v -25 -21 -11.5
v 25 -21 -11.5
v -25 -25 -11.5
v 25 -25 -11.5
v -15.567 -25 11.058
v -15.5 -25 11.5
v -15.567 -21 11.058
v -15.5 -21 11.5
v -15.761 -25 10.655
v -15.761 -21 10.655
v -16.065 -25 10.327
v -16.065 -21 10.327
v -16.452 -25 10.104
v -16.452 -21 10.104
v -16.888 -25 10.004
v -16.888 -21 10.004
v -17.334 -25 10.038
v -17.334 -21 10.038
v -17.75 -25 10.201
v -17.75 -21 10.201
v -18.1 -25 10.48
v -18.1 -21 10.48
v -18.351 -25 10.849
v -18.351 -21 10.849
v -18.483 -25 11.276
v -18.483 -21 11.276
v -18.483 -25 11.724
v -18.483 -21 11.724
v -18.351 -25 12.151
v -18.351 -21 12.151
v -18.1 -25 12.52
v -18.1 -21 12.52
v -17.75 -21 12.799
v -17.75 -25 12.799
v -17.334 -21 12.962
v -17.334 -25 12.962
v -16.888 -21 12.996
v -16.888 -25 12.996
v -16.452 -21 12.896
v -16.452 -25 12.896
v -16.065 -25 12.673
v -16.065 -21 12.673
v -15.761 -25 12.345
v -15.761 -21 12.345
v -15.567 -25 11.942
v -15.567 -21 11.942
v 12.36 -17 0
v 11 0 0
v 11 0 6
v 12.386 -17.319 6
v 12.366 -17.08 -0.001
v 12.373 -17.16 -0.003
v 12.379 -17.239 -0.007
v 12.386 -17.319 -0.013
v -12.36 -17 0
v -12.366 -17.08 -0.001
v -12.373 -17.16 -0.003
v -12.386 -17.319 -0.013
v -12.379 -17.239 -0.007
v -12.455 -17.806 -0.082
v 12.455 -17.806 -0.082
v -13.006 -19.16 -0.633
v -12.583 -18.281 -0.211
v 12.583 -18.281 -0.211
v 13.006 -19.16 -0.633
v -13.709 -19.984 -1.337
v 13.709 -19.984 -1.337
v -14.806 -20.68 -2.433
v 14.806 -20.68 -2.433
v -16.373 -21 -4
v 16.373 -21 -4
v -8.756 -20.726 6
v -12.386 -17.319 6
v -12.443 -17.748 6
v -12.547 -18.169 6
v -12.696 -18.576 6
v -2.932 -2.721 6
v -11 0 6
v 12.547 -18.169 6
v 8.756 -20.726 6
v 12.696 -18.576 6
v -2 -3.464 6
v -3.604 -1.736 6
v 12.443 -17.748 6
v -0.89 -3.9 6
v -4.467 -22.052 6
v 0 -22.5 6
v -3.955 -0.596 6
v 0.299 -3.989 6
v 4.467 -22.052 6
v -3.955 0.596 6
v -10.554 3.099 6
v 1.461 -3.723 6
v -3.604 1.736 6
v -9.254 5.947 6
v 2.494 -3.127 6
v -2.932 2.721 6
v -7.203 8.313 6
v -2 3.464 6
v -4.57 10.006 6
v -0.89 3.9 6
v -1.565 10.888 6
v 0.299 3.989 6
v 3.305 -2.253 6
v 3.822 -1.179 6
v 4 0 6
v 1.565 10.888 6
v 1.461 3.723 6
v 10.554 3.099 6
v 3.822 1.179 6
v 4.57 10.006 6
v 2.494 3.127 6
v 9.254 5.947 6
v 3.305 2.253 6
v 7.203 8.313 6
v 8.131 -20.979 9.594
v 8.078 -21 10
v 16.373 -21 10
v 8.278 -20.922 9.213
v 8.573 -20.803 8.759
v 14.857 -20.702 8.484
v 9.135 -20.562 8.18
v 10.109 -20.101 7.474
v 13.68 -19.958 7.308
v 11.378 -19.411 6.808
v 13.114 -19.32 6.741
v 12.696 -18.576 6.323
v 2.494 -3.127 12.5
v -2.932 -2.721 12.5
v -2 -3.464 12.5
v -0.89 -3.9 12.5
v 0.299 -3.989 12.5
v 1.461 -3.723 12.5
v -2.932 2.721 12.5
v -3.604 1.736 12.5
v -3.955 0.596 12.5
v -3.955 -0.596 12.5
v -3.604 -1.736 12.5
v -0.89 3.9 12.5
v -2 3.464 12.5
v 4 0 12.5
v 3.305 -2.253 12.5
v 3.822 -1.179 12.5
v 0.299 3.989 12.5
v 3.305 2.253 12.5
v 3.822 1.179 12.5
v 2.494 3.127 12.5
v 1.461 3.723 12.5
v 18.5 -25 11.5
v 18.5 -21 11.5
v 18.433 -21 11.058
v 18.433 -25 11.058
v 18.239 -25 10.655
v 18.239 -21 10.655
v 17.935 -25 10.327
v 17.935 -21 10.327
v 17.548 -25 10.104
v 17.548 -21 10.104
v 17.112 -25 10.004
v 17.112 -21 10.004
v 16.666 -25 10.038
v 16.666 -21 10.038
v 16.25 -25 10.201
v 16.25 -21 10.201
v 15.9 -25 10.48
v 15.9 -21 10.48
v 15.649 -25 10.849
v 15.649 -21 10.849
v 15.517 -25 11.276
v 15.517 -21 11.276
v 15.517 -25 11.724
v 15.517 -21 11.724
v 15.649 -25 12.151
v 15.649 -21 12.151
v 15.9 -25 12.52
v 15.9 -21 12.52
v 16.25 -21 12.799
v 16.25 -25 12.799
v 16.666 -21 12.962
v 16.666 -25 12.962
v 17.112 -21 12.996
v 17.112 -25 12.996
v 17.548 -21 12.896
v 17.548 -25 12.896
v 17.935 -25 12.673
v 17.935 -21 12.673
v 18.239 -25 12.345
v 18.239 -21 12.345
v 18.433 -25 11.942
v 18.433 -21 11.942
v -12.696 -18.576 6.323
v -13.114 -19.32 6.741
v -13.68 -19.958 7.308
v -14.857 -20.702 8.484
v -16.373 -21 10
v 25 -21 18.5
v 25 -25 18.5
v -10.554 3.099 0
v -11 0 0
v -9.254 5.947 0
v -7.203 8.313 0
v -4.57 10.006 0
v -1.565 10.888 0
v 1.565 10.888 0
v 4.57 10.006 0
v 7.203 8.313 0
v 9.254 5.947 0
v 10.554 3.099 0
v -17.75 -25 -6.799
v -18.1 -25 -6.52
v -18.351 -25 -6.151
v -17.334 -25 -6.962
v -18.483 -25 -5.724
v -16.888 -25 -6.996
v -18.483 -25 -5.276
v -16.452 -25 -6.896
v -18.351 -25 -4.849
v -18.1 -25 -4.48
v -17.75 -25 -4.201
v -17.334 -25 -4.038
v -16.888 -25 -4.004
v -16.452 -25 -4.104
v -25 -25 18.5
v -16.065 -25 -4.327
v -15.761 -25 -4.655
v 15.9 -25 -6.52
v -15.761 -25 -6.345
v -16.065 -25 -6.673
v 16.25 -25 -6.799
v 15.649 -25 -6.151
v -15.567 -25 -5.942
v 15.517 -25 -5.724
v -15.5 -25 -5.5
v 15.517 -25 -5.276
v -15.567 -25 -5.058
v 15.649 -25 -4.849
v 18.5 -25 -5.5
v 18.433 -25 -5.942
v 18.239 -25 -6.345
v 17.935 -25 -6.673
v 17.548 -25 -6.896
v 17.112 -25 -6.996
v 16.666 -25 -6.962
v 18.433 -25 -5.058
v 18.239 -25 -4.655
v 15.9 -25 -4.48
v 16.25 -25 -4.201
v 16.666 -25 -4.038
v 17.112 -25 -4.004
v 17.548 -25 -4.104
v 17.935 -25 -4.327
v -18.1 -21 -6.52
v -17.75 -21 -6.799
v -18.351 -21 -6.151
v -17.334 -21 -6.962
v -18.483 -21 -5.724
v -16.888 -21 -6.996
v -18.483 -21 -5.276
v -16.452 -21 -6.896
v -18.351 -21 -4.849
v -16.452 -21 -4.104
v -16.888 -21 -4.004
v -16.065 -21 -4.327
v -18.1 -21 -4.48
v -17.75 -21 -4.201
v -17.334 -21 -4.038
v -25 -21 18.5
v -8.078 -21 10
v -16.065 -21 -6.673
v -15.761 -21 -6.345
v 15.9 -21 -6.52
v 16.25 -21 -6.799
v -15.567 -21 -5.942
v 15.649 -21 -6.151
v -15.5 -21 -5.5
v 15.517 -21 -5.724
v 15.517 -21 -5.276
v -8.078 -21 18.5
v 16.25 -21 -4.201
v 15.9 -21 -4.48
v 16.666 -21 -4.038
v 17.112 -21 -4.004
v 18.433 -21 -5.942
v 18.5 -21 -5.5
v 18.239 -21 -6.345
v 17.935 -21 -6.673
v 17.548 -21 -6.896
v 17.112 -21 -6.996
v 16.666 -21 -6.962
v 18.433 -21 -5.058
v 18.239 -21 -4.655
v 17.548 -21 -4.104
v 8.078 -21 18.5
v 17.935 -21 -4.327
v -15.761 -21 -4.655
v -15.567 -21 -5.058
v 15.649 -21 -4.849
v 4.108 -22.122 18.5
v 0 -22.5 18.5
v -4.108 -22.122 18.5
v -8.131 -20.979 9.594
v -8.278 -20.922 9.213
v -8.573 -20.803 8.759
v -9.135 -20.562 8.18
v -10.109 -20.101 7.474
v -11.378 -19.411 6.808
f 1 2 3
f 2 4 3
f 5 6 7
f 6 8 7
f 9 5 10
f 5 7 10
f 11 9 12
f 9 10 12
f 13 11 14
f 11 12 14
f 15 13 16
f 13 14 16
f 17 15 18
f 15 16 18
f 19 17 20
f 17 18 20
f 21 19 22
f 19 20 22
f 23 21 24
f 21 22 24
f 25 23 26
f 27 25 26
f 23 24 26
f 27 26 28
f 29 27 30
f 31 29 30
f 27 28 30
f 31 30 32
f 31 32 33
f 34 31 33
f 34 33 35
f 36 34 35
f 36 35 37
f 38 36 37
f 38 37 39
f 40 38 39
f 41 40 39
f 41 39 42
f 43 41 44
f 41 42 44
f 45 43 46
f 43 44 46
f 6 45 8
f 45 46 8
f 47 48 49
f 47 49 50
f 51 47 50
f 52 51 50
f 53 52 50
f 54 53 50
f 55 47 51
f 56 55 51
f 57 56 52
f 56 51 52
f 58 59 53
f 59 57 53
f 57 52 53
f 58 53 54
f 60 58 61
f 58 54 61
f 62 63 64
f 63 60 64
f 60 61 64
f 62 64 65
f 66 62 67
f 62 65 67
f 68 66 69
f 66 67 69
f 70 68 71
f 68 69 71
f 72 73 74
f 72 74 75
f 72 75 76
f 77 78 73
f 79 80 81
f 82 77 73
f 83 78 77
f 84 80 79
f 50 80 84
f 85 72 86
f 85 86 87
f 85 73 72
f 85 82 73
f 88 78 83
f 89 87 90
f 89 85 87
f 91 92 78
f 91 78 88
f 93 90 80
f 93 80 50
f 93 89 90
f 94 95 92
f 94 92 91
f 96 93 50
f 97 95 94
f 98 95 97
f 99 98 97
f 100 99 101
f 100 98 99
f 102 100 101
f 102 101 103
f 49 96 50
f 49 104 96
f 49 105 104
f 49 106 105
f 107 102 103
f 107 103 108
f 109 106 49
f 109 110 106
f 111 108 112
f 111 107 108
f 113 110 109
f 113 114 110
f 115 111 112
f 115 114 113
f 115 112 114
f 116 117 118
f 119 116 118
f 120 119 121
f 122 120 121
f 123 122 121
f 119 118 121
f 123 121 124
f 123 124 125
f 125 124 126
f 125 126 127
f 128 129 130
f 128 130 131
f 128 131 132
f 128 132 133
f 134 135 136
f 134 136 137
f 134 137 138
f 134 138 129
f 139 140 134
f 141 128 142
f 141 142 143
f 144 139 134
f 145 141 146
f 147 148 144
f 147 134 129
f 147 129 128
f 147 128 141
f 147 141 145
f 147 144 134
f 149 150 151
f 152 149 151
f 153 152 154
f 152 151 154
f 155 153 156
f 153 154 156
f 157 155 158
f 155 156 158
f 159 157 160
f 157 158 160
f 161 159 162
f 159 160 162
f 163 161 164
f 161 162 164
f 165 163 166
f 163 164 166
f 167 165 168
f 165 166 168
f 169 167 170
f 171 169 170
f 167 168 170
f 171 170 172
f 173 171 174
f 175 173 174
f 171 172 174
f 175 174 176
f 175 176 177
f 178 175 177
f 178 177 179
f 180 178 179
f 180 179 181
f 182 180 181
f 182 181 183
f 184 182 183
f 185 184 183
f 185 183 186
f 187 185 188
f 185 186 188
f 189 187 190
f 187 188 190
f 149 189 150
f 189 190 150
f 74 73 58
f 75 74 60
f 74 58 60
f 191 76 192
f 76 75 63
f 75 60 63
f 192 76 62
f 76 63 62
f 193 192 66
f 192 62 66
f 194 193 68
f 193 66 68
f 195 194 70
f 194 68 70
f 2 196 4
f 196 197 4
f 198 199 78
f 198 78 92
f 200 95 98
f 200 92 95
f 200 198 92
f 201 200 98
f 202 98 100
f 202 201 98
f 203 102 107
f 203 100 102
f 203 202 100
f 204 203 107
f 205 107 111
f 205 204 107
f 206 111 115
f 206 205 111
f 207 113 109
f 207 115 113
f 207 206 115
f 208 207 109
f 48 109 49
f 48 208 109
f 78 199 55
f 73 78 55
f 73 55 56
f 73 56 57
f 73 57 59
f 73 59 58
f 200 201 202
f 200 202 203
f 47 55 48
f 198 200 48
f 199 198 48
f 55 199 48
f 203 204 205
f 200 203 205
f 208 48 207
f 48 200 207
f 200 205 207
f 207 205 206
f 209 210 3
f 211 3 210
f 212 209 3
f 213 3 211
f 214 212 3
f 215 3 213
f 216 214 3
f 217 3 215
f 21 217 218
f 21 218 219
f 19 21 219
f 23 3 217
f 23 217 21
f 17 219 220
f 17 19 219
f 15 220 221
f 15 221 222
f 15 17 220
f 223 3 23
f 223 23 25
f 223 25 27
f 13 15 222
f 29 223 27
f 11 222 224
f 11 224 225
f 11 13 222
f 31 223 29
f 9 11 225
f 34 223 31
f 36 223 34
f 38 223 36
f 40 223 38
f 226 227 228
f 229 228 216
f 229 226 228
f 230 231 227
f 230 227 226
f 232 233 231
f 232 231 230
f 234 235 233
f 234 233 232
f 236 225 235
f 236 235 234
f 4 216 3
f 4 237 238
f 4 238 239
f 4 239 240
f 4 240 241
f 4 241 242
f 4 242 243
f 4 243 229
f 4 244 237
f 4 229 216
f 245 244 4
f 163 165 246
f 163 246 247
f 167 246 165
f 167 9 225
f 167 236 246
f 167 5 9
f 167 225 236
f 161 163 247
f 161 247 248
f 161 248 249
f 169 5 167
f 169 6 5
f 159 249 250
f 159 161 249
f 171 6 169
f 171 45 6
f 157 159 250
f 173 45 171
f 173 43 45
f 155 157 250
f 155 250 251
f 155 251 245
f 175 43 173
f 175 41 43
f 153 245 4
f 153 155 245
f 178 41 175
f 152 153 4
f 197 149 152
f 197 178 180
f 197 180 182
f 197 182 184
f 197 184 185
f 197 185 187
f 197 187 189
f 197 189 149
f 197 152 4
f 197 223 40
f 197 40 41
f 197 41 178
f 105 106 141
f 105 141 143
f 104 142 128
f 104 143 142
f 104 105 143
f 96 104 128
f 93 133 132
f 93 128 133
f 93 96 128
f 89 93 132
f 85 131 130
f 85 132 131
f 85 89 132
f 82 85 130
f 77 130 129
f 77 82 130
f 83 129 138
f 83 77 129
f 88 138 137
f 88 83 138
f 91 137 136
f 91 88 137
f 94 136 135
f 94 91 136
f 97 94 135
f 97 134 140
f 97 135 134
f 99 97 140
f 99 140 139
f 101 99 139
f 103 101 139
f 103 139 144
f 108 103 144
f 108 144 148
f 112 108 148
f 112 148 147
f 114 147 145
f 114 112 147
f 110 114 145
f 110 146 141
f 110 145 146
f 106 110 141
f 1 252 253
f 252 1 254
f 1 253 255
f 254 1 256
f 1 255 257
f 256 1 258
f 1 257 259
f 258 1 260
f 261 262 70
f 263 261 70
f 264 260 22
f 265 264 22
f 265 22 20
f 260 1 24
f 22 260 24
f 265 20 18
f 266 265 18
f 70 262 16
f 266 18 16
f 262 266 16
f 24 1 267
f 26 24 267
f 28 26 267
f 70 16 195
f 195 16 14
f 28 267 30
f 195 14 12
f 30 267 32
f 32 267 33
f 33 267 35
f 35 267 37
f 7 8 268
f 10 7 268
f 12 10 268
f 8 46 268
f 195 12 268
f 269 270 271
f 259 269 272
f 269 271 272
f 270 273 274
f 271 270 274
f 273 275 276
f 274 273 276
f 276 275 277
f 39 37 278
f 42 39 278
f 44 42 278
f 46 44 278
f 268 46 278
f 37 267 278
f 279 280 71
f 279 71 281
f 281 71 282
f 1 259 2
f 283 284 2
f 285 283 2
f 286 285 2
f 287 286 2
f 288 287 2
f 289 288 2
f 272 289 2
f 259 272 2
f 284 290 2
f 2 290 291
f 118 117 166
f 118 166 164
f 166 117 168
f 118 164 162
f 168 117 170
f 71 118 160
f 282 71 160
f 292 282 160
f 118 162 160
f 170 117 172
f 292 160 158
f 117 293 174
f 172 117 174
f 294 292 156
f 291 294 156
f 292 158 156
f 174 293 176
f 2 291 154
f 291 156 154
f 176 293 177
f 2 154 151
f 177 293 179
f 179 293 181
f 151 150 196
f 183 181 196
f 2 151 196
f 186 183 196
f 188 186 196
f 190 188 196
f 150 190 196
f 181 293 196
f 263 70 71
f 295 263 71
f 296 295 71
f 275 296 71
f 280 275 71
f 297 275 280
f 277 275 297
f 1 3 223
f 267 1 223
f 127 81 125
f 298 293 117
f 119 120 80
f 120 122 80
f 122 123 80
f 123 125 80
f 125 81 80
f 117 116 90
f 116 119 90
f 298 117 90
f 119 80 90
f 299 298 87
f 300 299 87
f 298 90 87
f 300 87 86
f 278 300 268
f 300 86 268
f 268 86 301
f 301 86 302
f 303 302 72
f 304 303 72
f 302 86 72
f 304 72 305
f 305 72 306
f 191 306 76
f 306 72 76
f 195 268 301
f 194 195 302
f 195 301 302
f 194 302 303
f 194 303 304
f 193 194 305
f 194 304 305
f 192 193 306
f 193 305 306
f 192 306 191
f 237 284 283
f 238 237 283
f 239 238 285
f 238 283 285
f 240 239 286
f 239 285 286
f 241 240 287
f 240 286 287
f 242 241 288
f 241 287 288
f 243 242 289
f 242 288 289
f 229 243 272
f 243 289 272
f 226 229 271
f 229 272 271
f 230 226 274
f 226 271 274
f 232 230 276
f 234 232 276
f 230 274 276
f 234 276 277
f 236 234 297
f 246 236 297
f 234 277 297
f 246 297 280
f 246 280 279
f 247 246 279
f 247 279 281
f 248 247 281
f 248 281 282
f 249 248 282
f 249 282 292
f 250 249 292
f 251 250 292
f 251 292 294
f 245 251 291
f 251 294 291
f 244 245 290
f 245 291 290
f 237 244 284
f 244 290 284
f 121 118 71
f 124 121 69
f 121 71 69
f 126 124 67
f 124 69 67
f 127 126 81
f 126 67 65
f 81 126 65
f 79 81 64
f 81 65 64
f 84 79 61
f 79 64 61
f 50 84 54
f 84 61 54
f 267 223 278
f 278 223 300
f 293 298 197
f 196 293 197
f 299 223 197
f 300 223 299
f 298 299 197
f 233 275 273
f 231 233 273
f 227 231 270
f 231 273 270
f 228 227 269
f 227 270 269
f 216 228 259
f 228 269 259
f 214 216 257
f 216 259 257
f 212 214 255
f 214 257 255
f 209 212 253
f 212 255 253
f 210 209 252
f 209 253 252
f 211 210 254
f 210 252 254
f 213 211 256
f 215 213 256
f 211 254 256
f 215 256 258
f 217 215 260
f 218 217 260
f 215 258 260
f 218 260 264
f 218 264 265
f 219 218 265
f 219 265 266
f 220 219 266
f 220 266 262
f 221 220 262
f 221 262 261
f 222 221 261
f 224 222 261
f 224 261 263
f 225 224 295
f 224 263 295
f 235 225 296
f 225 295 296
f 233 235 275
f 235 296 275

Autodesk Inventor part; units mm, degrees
ref_plane "YZ Plane" through (0, 0, 0) normal (1, 0, 0) x (0, 1, 0)
ref_plane "XZ Plane" through (0, 0, 0) normal (0, 1, 0) x (-1, 0, 0)
ref_plane "XY Plane" through (0, 0, 0) normal (0, 0, 1) x (1, 0, 0)
sketch "Sketch1" plane through (0, 0, 0) normal (0, 0, 1) x (1, 0, 0)
  arc A0 (11, 0) -> (-11, 0) centre (0, 0) ccw
  line L0 (-11, 0) -> (11, 0)
  line L1 (0, 0) -> (0, -25)
  line L2 (-13, -25) -> (13, -25)
  line L3 (-11, 0) -> (-13, -25)
  line L4 (11, 0) -> (13, -25)
  dimension "d0" = 22
  dimension "d1" = 25
  dimension "d2" = 13
  dimension "d3" = 13
extrude "Extrusion1" add sketch "Sketch1" along normal blind 6
sketch "Sketch2" plane through (0, 0, 6) normal (0, 0, 1) x (1, 0, 0)
  circle A0 centre (0, 0) radius 4
  dimension "d6" = 8
extrude "Extrusion2" add sketch "Sketch2" along normal blind 6.5
sketch "Sketch3" plane through (-13, -25, 0) normal (0, -1, 0) x (1, 0, 0)
  line L0 (-12, 18.5) -> (38, 18.5)
  line L1 (38, 18.5) -> (38, -11.5)
  line L2 (38, -11.5) -> (-12, -11.5)
  line L3 (-12, -11.5) -> (-12, 18.5)
  point P0 (13, 0)
  dimension "d9" = 50
  dimension "d10" = 30
  dimension "d11" = 25
  dimension "d12" = 18.5
extrude "Extrusion3" add sketch "Sketch3" against normal blind 4
fillet "Fillet1" radius 4 4 edges at (0, -21, 6) (0, -21, 0) (-12.68, -21, 3) (12.68, -21, 3)
sketch "Sketch4" plane through (-25, -25, 18.5) normal (0, -1, 0) x (1, 0, 0)
  point P0 (25, -18.5)
sketch "Sketch5" plane through (-13, -21, 0) normal (0, 1, 0) x (1, 0, 0)
  circle A0 centre (30, 5.5) radius 1.5
  circle A1 centre (30, -11.5) radius 1.5
  circle A2 centre (-4, -11.5) radius 1.5
  circle A3 centre (-4, 5.5) radius 1.5
  line L0 (38, -18.5) -> (38, 11.5) projected
  line L1 (38, 11.5) -> (-12, 11.5) projected
  line L2 (-12, 11.5) -> (-12, -18.5) projected
  line L3 (-12, -18.5) -> (38, -18.5) projected
  point P0 (13, 0)
  dimension "d16" = 3
  dimension "d17" = 3
  dimension "d18" = 3
  dimension "d19" = 3
  dimension "d20" = 8
  dimension "d21" = 6
  dimension "d22" = 6
  dimension "d23" = 8
  dimension "d24" = 8
  dimension "d25" = 7
  dimension "d26" = 7
  dimension "d27" = 8
sketch "Sketch6" plane through (-13, -21, 0) normal (0, 1, 0) x (1, 0, 0)
  point P0 (13, 0)
extrude "Extrusion4" cut sketch "Sketch5" against normal blind 10 contours A0 | A1 | A2 | A3
sketch "Sketch7" plane through (0, 0, 12.5) normal (0, 0, 1) x (1, 0, 0)
  circle A0 centre (0, 0) radius 22.5
  circle A1 centre (0, 0) radius 4
  dimension "d30" = 45
  dimension "d31" = 8
extrude "Extrusion5" cut sketch "Sketch7" along normal mid plane 13
properties part number "bearing support"
